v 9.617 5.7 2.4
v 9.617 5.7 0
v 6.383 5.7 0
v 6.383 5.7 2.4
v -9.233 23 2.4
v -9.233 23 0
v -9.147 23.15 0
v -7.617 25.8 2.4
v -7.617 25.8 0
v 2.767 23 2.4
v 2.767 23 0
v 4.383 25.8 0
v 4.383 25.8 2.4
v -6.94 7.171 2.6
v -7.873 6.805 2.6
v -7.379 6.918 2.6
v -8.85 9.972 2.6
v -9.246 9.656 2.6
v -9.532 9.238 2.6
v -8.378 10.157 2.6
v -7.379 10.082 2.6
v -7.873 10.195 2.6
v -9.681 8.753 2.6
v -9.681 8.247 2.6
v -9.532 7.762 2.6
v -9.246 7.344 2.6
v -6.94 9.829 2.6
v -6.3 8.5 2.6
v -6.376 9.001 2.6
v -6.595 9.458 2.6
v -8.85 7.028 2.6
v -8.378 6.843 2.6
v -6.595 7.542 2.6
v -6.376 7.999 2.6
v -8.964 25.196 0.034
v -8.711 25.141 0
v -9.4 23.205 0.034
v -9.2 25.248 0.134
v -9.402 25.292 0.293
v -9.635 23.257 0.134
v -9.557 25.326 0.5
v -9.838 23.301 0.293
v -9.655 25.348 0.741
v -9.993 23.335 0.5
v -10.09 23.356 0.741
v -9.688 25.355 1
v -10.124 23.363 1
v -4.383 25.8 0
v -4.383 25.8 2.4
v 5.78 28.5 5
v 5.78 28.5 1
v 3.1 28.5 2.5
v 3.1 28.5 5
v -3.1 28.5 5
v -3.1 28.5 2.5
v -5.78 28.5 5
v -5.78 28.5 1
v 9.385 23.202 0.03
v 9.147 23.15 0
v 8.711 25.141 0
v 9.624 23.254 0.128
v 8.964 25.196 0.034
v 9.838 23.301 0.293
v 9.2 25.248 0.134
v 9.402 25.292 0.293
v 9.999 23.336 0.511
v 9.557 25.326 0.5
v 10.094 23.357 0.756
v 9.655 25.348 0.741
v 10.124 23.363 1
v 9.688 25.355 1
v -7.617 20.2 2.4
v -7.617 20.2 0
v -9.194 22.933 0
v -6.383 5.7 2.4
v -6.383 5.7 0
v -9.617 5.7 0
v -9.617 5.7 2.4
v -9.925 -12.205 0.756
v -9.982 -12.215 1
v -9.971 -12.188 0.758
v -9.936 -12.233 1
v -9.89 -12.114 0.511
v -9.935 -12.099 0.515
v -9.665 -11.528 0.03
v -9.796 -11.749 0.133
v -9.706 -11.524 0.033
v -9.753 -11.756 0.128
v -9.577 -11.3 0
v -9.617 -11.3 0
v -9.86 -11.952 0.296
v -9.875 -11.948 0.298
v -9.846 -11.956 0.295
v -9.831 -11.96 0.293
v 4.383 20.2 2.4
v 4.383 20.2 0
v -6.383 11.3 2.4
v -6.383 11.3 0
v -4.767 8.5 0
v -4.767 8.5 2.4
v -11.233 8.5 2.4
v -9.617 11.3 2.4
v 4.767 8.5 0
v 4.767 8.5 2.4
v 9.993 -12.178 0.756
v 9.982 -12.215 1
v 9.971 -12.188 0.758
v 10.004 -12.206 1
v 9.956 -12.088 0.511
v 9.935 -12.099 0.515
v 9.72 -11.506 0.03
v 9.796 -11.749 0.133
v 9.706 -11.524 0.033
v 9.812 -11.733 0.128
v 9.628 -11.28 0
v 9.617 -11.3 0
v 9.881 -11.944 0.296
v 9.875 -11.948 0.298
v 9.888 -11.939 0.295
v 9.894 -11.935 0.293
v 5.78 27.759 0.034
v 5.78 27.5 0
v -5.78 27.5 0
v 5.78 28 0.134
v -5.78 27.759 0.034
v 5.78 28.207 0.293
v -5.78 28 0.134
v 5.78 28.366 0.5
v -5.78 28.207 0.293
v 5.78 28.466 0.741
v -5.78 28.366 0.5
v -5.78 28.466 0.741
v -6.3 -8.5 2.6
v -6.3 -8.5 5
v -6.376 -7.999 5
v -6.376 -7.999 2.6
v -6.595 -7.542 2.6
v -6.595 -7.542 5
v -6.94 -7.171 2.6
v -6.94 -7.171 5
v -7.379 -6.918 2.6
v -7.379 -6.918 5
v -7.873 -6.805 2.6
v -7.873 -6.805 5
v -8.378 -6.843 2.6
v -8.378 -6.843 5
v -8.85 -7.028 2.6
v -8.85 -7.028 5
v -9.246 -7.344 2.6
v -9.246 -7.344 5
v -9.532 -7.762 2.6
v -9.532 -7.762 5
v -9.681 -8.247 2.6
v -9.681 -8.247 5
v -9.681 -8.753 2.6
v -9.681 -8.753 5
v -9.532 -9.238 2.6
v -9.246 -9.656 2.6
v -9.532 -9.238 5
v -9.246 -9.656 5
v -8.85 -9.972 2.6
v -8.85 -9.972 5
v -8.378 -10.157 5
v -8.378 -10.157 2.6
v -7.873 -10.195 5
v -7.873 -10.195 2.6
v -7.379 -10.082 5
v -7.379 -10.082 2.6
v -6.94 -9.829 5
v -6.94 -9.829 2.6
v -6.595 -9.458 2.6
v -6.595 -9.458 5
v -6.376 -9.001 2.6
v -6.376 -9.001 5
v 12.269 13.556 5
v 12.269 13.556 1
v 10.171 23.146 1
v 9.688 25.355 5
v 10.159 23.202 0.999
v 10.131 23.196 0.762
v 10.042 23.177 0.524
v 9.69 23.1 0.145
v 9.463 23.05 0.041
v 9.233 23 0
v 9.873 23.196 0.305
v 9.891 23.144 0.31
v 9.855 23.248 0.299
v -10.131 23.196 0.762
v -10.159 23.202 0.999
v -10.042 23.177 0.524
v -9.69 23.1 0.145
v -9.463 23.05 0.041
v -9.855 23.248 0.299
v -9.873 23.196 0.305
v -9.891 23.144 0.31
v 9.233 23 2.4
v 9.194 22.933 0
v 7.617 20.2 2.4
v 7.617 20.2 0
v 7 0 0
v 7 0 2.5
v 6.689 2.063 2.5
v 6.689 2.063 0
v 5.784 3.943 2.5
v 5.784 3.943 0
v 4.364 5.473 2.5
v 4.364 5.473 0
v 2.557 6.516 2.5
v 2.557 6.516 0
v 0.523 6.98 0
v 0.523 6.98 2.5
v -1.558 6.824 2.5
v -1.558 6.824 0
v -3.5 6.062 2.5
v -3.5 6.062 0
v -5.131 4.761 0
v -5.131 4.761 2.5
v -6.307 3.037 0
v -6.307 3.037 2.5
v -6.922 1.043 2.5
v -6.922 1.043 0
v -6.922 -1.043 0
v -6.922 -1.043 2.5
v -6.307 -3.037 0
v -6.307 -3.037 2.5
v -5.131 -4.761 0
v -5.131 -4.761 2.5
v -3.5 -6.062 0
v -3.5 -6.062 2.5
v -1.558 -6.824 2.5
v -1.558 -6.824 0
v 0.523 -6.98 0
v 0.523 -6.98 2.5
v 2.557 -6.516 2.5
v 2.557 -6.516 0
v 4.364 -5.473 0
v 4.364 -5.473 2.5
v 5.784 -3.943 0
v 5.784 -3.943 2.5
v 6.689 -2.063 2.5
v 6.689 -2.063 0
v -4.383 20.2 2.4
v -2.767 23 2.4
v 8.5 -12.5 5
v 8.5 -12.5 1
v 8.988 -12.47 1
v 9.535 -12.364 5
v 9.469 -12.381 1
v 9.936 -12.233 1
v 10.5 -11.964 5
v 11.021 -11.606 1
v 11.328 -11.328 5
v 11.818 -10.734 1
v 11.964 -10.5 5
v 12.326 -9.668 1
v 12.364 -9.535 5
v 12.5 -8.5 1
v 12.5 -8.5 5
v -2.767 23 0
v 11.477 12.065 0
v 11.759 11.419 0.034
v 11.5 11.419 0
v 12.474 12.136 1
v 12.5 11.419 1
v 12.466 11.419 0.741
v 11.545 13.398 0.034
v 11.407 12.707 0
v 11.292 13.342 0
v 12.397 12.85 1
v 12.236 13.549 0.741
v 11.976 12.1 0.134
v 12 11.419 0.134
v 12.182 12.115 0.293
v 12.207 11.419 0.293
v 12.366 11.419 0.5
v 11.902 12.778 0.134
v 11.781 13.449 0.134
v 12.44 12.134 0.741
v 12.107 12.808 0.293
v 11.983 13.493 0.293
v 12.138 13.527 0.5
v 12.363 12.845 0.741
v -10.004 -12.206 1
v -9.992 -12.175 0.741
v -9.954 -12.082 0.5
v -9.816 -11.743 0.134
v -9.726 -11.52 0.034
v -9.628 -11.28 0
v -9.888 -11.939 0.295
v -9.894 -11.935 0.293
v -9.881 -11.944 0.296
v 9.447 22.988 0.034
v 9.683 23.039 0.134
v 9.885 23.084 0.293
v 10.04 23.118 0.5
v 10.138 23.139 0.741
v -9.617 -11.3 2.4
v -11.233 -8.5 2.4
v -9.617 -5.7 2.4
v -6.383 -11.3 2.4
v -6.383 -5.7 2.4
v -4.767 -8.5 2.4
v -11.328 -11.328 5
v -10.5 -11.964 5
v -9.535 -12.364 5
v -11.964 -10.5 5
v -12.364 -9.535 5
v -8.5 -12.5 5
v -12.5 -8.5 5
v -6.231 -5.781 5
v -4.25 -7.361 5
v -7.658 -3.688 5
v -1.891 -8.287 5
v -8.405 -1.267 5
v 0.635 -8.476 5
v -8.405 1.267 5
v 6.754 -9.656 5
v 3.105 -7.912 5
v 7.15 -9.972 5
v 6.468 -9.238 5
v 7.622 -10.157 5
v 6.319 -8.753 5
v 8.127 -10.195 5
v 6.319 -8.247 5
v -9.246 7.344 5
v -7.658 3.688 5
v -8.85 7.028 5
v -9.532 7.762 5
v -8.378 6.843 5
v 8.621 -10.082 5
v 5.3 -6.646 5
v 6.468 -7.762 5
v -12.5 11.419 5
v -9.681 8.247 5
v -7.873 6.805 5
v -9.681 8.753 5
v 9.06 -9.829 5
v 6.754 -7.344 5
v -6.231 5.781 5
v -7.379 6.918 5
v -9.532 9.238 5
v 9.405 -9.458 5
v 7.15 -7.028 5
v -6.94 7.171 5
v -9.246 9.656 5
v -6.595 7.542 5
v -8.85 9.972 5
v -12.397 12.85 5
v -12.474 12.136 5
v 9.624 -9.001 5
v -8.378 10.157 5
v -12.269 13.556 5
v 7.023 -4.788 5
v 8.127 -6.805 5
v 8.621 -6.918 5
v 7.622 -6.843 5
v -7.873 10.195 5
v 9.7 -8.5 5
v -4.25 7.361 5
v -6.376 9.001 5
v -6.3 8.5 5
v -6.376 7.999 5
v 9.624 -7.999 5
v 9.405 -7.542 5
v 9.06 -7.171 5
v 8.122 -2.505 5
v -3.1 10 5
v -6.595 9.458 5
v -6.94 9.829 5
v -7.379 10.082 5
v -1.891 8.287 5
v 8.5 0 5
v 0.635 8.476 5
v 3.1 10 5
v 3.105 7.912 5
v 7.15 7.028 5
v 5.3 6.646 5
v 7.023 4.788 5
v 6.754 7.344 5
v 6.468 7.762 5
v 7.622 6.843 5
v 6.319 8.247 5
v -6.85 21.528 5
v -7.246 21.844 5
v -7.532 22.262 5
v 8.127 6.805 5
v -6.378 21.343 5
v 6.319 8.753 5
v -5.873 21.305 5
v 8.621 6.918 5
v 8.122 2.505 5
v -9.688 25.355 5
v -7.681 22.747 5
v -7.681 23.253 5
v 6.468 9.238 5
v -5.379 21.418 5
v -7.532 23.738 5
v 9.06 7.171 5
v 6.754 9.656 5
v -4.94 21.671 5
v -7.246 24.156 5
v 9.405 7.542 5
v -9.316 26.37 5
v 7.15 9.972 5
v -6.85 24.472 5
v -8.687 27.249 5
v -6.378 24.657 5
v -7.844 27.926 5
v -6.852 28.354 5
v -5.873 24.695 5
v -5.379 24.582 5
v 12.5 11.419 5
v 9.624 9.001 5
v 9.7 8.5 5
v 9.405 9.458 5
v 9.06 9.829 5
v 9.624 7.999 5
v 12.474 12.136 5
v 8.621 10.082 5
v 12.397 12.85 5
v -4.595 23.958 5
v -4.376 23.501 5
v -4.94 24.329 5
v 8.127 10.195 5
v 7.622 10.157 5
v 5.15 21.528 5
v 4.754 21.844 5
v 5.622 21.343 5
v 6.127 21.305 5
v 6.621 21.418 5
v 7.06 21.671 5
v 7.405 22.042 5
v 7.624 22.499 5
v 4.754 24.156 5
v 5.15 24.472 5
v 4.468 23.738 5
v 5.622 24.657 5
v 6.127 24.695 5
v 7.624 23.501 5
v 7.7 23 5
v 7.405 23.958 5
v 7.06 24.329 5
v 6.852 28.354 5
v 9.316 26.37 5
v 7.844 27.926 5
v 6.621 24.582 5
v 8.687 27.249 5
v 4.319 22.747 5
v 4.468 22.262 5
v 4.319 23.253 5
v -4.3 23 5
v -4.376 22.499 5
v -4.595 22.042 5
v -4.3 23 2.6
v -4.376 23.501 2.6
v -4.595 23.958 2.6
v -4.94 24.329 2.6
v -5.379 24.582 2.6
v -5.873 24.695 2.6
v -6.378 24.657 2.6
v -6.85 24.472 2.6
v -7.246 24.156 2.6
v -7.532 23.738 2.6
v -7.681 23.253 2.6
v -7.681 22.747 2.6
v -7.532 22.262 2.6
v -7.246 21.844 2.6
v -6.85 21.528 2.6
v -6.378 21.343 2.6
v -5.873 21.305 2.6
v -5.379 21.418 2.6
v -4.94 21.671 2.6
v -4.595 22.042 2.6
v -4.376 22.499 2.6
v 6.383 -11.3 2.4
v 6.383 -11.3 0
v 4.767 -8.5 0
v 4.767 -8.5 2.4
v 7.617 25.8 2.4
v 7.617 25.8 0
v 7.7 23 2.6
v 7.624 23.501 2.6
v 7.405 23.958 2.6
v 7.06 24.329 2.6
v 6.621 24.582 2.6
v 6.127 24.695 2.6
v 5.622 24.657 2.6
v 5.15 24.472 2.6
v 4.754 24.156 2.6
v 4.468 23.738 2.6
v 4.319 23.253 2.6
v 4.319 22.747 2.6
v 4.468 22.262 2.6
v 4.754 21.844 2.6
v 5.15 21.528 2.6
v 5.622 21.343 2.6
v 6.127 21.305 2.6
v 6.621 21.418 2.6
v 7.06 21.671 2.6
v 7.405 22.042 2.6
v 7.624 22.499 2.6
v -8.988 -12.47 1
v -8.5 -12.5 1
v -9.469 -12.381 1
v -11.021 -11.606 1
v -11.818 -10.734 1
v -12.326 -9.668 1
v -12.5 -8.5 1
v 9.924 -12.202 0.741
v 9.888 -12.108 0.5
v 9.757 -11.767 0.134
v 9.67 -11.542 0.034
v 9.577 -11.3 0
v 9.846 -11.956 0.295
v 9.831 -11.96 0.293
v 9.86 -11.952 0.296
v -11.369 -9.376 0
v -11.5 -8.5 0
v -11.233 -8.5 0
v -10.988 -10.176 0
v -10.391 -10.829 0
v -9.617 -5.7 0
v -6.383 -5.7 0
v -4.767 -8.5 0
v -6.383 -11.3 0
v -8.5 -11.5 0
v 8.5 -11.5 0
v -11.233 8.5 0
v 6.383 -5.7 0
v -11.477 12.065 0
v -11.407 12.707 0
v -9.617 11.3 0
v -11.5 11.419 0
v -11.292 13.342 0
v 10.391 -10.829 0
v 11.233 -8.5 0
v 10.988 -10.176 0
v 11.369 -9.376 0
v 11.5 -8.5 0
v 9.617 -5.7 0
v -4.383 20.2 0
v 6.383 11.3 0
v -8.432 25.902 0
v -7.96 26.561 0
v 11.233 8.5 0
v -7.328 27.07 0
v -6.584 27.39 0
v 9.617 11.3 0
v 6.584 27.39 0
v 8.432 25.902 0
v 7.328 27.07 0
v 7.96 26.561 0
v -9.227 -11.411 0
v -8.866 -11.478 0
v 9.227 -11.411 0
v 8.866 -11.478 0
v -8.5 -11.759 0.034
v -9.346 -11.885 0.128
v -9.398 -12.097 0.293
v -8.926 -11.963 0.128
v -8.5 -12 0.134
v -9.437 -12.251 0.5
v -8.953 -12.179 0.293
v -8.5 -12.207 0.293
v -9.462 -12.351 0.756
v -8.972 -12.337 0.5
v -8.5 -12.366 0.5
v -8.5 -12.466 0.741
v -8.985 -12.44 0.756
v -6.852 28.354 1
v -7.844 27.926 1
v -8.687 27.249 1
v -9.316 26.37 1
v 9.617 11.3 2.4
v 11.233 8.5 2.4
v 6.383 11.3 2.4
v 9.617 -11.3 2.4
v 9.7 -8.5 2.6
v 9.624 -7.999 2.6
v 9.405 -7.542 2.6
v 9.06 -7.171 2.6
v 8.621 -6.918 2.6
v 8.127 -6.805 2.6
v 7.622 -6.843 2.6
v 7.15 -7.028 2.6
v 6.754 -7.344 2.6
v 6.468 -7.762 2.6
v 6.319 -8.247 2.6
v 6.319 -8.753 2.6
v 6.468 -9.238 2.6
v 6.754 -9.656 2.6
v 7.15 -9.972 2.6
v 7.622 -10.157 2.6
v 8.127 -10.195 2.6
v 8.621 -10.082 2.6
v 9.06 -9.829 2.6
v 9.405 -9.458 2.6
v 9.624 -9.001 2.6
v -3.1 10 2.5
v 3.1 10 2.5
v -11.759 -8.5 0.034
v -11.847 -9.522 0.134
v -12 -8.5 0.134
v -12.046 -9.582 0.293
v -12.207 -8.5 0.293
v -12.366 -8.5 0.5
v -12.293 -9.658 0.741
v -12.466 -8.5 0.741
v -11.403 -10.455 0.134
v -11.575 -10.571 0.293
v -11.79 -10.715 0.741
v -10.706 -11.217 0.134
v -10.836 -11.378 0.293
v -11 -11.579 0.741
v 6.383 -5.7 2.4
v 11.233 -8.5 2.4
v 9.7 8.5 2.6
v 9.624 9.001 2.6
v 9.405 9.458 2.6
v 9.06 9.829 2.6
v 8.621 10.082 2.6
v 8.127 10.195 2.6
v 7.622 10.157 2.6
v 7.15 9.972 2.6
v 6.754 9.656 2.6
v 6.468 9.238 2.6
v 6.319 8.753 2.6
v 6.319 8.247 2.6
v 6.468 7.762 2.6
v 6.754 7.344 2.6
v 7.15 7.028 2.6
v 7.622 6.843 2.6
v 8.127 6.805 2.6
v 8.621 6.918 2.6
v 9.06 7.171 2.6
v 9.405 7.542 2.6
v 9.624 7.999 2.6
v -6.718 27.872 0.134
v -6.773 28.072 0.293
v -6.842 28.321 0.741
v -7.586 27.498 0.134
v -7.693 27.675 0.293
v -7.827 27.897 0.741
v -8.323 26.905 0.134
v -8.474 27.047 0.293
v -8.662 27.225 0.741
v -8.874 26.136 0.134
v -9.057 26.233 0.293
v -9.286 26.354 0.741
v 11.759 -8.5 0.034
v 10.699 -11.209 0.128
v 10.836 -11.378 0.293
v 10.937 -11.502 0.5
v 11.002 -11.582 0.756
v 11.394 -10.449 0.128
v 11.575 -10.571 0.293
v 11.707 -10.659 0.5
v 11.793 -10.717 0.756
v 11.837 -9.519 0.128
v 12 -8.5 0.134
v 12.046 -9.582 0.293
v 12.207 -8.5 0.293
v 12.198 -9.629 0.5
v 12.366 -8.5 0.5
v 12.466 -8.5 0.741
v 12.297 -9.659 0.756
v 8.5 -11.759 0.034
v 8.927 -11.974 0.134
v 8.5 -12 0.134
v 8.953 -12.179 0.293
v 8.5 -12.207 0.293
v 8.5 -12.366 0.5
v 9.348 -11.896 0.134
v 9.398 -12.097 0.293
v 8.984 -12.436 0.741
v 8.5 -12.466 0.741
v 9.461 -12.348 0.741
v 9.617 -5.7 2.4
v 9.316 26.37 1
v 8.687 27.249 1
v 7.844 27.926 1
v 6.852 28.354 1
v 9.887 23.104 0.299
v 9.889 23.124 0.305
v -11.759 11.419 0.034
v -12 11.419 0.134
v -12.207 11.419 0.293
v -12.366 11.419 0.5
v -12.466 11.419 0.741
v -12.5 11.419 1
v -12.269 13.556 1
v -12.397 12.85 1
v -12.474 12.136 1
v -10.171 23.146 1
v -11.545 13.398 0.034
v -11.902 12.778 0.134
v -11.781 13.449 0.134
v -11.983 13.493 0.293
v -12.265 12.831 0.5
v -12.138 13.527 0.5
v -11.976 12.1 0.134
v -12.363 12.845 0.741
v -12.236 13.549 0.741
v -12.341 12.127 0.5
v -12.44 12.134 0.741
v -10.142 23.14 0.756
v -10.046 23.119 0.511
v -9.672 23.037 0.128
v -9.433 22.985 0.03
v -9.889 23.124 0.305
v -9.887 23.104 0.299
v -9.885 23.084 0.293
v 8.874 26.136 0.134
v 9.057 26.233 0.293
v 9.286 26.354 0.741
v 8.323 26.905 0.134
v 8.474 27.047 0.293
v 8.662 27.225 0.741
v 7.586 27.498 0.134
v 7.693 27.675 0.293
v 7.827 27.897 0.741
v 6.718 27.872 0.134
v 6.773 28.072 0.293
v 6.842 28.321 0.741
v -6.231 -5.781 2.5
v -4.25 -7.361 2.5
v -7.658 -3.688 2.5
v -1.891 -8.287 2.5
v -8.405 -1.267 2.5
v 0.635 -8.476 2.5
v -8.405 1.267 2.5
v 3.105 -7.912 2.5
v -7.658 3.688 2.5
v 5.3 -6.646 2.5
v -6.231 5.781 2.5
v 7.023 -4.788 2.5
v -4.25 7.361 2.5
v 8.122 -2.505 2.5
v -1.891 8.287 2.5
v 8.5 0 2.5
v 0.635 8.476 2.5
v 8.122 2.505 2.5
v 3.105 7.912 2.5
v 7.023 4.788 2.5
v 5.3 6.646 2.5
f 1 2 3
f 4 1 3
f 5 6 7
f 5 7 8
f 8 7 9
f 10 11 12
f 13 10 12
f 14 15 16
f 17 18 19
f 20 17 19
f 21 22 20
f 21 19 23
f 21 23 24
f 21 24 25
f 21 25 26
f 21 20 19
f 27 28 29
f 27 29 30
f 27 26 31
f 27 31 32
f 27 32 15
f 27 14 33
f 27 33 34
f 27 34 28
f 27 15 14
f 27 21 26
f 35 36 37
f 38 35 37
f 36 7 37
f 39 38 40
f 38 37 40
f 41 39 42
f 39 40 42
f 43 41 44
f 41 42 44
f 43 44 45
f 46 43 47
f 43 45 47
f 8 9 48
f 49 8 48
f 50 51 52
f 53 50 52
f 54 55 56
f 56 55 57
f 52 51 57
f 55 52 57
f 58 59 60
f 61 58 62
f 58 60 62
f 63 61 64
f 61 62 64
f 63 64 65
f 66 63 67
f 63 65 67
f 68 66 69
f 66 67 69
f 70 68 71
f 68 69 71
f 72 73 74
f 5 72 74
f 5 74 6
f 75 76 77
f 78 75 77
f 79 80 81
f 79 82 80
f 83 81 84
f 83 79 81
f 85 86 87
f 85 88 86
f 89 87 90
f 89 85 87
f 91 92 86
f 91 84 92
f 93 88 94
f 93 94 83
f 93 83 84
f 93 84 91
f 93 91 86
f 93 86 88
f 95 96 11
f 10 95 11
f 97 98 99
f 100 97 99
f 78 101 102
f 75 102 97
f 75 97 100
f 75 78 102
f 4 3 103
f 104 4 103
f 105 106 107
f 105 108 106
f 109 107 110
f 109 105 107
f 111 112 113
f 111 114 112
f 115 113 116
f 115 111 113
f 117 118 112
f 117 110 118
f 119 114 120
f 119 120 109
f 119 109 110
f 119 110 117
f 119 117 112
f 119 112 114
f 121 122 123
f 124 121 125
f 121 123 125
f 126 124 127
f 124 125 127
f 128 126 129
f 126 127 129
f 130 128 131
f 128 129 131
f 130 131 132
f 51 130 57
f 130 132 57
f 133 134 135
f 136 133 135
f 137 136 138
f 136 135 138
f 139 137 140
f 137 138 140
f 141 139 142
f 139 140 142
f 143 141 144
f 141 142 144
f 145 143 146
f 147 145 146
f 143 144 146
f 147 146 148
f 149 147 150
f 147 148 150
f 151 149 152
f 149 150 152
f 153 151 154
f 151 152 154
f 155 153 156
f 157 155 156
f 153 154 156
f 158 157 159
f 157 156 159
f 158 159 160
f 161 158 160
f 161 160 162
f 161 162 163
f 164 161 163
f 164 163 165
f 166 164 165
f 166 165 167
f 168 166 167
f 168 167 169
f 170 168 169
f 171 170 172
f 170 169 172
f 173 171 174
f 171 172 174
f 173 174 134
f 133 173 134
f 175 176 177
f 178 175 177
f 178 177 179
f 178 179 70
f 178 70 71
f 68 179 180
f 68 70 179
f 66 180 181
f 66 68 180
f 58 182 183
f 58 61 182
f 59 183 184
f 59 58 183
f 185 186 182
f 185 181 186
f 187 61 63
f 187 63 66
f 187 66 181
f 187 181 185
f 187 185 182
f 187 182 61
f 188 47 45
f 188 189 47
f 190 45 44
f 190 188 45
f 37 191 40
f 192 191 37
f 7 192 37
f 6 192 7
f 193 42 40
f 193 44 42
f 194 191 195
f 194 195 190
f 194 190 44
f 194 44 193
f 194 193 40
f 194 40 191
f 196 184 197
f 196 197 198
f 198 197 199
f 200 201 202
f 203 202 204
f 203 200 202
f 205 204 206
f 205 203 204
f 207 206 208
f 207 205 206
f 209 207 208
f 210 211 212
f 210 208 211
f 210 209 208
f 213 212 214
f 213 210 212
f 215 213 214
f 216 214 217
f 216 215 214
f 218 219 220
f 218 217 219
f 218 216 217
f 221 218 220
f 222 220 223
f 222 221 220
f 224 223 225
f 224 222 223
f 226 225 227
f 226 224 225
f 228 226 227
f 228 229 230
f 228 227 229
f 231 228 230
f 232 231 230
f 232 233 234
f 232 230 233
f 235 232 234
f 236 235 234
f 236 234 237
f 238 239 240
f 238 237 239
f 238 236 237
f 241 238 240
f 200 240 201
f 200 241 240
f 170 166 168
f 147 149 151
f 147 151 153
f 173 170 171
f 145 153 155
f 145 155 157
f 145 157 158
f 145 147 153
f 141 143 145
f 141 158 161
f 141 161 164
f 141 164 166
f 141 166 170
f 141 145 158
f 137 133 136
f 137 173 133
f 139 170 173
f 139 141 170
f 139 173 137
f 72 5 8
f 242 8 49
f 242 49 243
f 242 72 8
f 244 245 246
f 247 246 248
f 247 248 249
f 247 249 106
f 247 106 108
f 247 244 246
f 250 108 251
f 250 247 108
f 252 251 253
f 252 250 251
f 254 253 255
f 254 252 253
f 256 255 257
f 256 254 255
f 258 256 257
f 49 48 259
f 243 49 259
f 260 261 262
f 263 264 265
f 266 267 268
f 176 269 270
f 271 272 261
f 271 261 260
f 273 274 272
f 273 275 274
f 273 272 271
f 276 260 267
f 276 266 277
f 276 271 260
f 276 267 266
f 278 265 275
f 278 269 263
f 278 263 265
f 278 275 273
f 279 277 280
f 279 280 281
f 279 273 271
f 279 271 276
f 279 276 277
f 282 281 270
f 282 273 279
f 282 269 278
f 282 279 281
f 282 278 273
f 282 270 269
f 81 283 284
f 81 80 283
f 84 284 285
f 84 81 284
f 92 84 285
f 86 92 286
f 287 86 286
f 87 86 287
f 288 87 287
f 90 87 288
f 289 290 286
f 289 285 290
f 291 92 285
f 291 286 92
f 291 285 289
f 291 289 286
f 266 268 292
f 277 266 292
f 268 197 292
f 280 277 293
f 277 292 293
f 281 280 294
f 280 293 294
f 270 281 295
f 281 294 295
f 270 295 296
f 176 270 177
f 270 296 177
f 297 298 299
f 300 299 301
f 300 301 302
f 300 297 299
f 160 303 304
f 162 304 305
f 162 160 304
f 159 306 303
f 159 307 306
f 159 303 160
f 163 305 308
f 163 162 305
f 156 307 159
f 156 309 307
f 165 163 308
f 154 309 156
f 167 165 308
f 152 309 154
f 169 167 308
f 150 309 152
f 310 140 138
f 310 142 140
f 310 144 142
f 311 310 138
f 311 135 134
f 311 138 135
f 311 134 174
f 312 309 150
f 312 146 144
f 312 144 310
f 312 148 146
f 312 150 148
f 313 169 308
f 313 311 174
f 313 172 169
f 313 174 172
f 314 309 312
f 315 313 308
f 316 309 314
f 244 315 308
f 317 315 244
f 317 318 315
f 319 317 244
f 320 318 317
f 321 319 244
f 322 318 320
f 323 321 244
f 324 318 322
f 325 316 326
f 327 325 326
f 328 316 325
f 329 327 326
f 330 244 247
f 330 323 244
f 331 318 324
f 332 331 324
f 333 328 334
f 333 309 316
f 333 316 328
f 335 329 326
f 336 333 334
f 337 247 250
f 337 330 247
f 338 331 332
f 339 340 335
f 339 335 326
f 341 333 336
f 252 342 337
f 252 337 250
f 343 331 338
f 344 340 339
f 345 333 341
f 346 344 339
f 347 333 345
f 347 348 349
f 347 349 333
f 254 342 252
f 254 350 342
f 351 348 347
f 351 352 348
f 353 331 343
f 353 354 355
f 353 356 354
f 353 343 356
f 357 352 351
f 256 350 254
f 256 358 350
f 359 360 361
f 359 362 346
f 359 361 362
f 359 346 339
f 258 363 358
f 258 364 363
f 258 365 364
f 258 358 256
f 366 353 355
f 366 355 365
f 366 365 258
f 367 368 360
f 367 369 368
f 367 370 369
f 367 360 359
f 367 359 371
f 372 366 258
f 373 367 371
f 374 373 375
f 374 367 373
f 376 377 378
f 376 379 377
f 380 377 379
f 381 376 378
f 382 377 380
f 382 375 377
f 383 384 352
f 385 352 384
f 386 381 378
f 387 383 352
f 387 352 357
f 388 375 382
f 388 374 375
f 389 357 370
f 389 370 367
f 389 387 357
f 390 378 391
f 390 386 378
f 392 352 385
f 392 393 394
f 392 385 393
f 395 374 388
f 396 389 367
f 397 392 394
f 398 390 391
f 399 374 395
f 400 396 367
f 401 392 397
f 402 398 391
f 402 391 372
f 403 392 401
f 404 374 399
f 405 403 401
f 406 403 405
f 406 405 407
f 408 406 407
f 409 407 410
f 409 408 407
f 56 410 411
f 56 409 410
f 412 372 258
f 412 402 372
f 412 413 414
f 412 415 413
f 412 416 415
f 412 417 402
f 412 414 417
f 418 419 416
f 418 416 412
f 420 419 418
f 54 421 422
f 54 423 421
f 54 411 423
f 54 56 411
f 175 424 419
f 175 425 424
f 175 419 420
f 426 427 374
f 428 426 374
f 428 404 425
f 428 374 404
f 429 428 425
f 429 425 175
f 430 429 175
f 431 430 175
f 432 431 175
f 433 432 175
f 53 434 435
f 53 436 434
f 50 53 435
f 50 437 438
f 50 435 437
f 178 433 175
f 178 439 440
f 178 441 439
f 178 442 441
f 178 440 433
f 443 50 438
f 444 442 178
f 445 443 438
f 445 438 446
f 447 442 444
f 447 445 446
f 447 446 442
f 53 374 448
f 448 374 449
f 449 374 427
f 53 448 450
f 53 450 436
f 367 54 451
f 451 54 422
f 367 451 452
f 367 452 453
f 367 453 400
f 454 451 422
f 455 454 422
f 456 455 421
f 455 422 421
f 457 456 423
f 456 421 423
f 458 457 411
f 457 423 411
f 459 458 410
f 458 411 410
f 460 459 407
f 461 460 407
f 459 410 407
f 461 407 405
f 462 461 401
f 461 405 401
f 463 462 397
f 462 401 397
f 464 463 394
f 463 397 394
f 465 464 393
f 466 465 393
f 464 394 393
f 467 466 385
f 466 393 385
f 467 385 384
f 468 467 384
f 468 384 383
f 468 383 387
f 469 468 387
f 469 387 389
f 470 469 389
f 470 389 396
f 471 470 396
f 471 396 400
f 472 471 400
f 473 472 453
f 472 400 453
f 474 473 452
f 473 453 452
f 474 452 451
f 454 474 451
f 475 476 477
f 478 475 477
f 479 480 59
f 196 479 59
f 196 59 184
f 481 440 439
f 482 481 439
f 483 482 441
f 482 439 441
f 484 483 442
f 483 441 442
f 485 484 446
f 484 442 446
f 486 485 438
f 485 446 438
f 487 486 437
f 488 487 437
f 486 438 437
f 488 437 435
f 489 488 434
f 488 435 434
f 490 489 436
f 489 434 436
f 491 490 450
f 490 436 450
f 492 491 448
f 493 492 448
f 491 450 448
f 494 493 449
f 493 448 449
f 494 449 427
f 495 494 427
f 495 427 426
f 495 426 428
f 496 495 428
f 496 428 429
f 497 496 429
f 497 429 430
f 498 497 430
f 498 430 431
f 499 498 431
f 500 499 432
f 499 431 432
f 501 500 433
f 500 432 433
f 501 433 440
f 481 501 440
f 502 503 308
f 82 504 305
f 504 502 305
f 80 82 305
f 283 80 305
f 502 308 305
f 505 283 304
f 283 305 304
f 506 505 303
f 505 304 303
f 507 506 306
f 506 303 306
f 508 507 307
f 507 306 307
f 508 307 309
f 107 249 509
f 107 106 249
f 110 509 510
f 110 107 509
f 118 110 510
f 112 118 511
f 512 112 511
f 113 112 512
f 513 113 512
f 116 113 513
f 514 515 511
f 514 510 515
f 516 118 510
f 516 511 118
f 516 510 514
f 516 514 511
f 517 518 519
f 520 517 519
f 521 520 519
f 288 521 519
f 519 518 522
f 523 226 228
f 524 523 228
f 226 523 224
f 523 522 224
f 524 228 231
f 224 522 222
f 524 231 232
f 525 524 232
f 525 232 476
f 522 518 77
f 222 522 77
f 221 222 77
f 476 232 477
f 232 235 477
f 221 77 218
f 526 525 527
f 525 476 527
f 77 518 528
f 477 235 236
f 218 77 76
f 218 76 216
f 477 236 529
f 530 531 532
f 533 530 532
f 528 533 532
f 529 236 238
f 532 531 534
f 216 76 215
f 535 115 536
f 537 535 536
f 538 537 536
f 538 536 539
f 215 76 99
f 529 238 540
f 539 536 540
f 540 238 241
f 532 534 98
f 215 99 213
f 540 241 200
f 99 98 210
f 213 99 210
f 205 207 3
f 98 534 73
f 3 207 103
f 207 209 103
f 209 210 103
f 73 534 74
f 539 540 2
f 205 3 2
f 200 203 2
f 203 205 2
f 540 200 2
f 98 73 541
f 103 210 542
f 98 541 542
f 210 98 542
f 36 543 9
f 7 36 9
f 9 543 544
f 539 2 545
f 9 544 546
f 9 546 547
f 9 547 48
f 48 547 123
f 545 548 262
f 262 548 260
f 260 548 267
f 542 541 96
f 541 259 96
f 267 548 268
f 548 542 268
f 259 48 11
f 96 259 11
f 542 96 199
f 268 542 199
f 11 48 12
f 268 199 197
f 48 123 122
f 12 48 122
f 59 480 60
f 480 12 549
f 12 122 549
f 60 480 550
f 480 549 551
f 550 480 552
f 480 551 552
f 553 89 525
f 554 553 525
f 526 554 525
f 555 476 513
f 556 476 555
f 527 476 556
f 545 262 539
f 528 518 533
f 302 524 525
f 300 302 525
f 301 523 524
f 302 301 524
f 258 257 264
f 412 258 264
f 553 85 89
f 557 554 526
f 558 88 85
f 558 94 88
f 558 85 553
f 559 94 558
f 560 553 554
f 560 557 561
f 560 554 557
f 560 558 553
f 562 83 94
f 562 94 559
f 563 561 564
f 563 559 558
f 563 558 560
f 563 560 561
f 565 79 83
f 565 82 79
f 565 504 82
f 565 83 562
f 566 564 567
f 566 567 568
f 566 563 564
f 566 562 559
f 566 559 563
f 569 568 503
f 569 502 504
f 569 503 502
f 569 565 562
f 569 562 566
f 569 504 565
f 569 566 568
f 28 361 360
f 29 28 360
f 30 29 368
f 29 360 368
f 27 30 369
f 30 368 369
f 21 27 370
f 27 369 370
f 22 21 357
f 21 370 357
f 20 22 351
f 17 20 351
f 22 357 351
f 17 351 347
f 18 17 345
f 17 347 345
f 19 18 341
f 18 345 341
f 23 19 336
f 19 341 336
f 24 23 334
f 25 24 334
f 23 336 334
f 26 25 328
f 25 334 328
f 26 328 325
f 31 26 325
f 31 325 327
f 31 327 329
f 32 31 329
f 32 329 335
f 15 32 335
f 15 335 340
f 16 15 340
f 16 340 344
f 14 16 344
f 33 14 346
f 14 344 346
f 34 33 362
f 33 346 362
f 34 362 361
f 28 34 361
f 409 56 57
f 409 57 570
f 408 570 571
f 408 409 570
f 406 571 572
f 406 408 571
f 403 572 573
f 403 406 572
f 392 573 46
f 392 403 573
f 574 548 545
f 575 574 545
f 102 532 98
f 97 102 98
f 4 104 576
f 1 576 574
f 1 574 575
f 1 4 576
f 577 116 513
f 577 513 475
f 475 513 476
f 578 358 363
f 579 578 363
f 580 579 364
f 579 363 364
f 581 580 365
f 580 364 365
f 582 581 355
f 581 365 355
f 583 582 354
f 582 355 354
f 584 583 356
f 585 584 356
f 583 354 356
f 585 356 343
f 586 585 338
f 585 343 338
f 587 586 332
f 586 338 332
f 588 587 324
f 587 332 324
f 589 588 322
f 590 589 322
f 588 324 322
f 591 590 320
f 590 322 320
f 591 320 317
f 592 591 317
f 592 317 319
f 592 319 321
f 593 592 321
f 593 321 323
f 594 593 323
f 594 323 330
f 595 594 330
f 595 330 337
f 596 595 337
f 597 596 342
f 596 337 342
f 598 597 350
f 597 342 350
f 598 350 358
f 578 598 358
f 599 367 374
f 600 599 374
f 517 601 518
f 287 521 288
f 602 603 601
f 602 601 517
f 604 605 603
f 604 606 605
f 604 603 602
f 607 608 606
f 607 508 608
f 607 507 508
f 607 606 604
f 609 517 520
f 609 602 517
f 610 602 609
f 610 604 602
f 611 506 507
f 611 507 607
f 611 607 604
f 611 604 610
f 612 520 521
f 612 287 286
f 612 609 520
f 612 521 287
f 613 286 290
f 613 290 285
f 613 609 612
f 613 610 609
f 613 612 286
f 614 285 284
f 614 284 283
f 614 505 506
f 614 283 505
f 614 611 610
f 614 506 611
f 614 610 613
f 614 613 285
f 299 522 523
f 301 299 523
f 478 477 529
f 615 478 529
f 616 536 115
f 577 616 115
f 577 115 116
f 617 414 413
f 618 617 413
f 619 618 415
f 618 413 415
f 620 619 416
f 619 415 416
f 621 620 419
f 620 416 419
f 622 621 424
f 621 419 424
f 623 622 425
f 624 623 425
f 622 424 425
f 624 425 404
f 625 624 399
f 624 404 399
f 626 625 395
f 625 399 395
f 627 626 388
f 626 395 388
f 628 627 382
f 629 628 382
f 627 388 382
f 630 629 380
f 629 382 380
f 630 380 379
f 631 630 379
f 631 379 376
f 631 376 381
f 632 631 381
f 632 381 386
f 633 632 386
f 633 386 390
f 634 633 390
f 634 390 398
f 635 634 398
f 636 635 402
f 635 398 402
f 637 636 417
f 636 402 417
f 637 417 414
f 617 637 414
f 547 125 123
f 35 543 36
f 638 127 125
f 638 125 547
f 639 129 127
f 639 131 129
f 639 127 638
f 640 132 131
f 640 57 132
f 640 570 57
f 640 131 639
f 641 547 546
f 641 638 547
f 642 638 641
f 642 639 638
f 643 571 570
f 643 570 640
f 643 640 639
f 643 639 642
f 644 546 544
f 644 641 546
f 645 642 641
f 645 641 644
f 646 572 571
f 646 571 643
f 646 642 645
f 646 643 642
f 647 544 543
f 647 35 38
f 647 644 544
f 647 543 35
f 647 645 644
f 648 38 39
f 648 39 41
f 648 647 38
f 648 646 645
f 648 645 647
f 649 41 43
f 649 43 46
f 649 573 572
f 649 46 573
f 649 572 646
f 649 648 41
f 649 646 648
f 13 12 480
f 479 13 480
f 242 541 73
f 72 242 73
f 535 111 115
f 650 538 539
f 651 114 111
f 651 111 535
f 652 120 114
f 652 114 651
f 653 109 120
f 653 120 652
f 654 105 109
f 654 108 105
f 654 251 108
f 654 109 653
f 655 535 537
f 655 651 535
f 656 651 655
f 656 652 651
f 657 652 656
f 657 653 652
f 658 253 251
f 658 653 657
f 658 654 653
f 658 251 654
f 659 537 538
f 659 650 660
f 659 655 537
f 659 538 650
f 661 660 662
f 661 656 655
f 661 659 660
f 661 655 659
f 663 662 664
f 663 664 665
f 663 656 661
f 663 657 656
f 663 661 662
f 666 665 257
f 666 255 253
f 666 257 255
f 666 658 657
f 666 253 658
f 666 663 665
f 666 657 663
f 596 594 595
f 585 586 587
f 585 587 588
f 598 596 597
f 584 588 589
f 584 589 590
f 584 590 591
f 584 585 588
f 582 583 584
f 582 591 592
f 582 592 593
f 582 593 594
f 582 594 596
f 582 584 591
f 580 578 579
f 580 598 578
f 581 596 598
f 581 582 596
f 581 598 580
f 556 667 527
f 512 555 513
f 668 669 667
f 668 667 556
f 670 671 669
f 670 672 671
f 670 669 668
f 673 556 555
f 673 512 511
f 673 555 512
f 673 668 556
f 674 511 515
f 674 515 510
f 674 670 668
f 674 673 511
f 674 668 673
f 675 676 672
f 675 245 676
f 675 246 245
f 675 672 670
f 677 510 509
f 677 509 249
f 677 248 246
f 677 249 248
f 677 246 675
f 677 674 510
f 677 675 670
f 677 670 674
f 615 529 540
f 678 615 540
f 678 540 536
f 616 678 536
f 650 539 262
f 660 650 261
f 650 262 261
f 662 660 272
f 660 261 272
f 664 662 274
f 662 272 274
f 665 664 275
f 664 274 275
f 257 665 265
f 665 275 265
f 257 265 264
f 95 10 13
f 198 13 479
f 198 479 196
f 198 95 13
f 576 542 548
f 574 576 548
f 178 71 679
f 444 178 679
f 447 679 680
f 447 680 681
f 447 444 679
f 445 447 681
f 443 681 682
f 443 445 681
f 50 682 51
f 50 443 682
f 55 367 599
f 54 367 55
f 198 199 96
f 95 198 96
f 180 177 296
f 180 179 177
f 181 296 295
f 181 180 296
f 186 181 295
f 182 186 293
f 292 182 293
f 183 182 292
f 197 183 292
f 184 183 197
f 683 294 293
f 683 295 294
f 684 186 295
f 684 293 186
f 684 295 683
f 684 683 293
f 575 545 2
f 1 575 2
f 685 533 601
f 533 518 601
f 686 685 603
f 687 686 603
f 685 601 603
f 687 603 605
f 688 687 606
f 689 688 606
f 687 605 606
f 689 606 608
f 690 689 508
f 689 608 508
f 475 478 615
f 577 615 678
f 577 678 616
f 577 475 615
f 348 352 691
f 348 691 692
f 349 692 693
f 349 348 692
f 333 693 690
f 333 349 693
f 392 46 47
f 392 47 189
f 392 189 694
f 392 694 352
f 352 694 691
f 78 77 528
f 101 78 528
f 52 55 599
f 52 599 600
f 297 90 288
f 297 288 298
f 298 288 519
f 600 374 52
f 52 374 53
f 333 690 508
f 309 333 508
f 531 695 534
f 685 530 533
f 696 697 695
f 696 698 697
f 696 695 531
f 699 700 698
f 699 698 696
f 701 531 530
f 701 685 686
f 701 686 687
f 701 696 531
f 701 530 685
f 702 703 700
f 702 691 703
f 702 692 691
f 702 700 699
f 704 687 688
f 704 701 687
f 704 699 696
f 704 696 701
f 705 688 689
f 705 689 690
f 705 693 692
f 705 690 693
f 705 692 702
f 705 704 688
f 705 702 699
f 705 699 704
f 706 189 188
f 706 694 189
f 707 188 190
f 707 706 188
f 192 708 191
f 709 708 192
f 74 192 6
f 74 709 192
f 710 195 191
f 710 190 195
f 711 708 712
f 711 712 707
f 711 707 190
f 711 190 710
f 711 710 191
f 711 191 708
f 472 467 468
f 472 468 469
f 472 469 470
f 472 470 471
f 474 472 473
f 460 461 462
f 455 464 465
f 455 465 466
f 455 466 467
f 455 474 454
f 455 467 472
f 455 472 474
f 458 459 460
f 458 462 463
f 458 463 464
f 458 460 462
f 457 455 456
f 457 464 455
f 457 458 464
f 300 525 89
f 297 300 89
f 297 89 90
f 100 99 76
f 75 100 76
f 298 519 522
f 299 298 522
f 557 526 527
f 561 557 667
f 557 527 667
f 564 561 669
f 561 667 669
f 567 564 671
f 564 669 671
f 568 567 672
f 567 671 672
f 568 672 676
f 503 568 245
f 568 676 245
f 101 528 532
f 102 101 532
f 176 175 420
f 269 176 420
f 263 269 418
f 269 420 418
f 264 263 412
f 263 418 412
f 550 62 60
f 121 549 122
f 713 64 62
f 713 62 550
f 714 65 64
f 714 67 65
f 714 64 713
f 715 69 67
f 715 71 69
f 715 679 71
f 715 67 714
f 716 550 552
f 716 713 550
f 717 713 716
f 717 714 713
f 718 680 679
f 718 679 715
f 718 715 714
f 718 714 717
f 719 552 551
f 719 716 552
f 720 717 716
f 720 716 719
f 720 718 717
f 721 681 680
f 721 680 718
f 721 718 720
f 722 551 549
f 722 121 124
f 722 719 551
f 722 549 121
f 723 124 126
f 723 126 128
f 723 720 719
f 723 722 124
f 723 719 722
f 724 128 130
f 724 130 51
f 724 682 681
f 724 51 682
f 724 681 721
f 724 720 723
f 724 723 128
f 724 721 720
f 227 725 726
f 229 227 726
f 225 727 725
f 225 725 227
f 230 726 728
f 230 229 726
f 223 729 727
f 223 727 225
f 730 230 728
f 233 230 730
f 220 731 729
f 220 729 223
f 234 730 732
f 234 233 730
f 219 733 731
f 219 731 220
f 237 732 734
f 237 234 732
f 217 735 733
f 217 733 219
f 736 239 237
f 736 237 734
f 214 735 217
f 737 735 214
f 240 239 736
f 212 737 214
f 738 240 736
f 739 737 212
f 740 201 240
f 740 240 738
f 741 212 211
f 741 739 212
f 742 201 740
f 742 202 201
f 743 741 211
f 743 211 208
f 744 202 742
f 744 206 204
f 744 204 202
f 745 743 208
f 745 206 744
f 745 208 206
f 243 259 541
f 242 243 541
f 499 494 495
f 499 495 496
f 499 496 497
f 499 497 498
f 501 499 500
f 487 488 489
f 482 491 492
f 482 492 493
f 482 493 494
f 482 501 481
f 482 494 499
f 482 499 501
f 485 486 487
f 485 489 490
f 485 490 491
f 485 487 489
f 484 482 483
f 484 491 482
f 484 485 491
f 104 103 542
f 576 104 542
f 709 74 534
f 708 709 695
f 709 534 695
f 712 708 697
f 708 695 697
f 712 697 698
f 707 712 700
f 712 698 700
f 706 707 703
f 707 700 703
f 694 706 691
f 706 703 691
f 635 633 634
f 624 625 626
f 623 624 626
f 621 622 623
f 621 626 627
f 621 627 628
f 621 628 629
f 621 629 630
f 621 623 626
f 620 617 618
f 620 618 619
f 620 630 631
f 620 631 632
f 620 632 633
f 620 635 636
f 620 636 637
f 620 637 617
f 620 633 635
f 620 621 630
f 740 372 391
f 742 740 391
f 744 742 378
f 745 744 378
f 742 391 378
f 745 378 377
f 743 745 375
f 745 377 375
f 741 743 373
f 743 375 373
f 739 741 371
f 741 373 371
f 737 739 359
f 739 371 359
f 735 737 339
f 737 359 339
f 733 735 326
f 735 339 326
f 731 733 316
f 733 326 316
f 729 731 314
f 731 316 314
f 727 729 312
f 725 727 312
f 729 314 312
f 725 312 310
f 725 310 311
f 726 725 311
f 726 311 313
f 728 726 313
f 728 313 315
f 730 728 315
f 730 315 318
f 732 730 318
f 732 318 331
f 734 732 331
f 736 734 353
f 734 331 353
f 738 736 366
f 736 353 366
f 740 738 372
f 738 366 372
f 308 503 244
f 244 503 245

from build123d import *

# Parameters (mm, degrees)
SKETCH_R        = 7
PAD_DEPTH       = 5
SKETCH001_R     = 8.5
SKETCH001_W     = 6.2
SKETCH001_H     = 20
POCKET_DEPTH    = 2.5
FILLET_R        = 4
FILLET001_R     = 4
POCKET001_DEPTH = 2.4
SKETCH003_R     = 1.7
POCKET002_DEPTH = 2.4
FILLET002_R     = 4
FILLET003_R     = 4
FILLET004_R     = 10
FILLET005_R     = 10
FILLET006_R     = 1


with BuildPart() as part:
    # Sketch → Pad (new body)
    with BuildSketch(Plane.XY):
        Polygon((-12.5, -12.5), (12.5, -12.5), (12.5, 12.5), (9, 28.5), (-9, 28.5), (-12.5, 12.5), align=None)
        Circle(SKETCH_R, mode=Mode.SUBTRACT)
    extrude(amount=PAD_DEPTH)

    # Sketch001 → Pocket (cut)
    with BuildSketch(Plane.XY.offset(5)):
        Circle(SKETCH001_R)
        with Locations((0, 20)):
            Rectangle(SKETCH001_W, SKETCH001_H)
    extrude(amount=-POCKET_DEPTH, mode=Mode.SUBTRACT)

    # Fillet
    fillet_edges = [part.edges().sort_by_distance(p)[0] for p in [
        (-12.5, -12.5, 2.5),
    ]]
    fillet(fillet_edges, radius=FILLET_R)

    # Fillet001
    fillet001_edges = [part.edges().sort_by_distance(p)[0] for p in [
        (12.5, -12.5, 2.5),
    ]]
    fillet(fillet001_edges, radius=FILLET001_R)

    # Sketch002 → Pocket001 (cut)
    with BuildSketch(Plane(origin=(0, 0, 0), x_dir=(1, 0, 0), z_dir=(0, 0, -1))):
        Polygon((-9.616581, 11.3), (-11.233162, 8.5), (-9.616581, 5.7), (-6.383419, 5.7), (-4.766838, 8.5), (-6.383419, 11.3), align=None)
        Polygon((6.383419, 11.3), (4.766838, 8.5), (6.383419, 5.7), (9.616581, 5.7), (11.233162, 8.5), (9.616581, 11.3), align=None)
        Polygon((-9.616581, -5.7), (-11.233162, -8.5), (-9.616581, -11.3), (-6.383419, -11.3), (-4.766838, -8.5), (-6.383419, -5.7), align=None)
        Polygon((6.383419, -5.7), (4.766838, -8.5), (6.383419, -11.3), (9.616581, -11.3), (11.233162, -8.5), (9.616581, -5.7), align=None)
        Polygon((-7.616581, -20.2), (-9.233162, -23), (-7.616581, -25.8), (-4.383419, -25.8), (-2.766838, -23), (-4.383419, -20.2), align=None)
        Polygon((4.383419, -20.2), (2.766838, -23), (4.383419, -25.8), (7.616581, -25.8), (9.233162, -23), (7.616581, -20.2), align=None)
    extrude(amount=-POCKET001_DEPTH, mode=Mode.SUBTRACT)

    # Sketch003 → Pocket002 (cut)
    with BuildSketch(Plane.XY.offset(5)):
        with Locations((-8, 8.5)):
            Circle(SKETCH003_R)
        with Locations((8, 8.5)):
            Circle(SKETCH003_R)
        with Locations((-8, -8.5)):
            Circle(SKETCH003_R)
        with Locations((8, -8.5)):
            Circle(SKETCH003_R)
        with Locations((-6, 23)):
            Circle(SKETCH003_R)
        with Locations((6, 23)):
            Circle(SKETCH003_R)
    extrude(amount=-POCKET002_DEPTH, mode=Mode.SUBTRACT)

    # Fillet002
    fillet002_edges = [part.edges().sort_by_distance(p)[0] for p in [
        (9, 28.5, 2.5),
    ]]
    fillet(fillet002_edges, radius=FILLET002_R)

    # Fillet003
    fillet003_edges = [part.edges().sort_by_distance(p)[0] for p in [
        (-9, 28.5, 2.5),
    ]]
    fillet(fillet003_edges, radius=FILLET003_R)

    # Fillet004
    fillet004_edges = [part.edges().sort_by_distance(p)[0] for p in [
        (12.5, 12.5, 2.5),
    ]]
    fillet(fillet004_edges, radius=FILLET004_R)

    # Fillet005
    fillet005_edges = [part.edges().sort_by_distance(p)[0] for p in [
        (-12.5, 12.5, 2.5),
    ]]
    fillet(fillet005_edges, radius=FILLET005_R)

    # Fillet006
    fillet006_edges = [part.edges().sort_by_distance(p)[0] for p in [
        (-12.5, 1.459515, 0),
    ]]
    fillet(fillet006_edges, radius=FILLET006_R)


solid = part.part
